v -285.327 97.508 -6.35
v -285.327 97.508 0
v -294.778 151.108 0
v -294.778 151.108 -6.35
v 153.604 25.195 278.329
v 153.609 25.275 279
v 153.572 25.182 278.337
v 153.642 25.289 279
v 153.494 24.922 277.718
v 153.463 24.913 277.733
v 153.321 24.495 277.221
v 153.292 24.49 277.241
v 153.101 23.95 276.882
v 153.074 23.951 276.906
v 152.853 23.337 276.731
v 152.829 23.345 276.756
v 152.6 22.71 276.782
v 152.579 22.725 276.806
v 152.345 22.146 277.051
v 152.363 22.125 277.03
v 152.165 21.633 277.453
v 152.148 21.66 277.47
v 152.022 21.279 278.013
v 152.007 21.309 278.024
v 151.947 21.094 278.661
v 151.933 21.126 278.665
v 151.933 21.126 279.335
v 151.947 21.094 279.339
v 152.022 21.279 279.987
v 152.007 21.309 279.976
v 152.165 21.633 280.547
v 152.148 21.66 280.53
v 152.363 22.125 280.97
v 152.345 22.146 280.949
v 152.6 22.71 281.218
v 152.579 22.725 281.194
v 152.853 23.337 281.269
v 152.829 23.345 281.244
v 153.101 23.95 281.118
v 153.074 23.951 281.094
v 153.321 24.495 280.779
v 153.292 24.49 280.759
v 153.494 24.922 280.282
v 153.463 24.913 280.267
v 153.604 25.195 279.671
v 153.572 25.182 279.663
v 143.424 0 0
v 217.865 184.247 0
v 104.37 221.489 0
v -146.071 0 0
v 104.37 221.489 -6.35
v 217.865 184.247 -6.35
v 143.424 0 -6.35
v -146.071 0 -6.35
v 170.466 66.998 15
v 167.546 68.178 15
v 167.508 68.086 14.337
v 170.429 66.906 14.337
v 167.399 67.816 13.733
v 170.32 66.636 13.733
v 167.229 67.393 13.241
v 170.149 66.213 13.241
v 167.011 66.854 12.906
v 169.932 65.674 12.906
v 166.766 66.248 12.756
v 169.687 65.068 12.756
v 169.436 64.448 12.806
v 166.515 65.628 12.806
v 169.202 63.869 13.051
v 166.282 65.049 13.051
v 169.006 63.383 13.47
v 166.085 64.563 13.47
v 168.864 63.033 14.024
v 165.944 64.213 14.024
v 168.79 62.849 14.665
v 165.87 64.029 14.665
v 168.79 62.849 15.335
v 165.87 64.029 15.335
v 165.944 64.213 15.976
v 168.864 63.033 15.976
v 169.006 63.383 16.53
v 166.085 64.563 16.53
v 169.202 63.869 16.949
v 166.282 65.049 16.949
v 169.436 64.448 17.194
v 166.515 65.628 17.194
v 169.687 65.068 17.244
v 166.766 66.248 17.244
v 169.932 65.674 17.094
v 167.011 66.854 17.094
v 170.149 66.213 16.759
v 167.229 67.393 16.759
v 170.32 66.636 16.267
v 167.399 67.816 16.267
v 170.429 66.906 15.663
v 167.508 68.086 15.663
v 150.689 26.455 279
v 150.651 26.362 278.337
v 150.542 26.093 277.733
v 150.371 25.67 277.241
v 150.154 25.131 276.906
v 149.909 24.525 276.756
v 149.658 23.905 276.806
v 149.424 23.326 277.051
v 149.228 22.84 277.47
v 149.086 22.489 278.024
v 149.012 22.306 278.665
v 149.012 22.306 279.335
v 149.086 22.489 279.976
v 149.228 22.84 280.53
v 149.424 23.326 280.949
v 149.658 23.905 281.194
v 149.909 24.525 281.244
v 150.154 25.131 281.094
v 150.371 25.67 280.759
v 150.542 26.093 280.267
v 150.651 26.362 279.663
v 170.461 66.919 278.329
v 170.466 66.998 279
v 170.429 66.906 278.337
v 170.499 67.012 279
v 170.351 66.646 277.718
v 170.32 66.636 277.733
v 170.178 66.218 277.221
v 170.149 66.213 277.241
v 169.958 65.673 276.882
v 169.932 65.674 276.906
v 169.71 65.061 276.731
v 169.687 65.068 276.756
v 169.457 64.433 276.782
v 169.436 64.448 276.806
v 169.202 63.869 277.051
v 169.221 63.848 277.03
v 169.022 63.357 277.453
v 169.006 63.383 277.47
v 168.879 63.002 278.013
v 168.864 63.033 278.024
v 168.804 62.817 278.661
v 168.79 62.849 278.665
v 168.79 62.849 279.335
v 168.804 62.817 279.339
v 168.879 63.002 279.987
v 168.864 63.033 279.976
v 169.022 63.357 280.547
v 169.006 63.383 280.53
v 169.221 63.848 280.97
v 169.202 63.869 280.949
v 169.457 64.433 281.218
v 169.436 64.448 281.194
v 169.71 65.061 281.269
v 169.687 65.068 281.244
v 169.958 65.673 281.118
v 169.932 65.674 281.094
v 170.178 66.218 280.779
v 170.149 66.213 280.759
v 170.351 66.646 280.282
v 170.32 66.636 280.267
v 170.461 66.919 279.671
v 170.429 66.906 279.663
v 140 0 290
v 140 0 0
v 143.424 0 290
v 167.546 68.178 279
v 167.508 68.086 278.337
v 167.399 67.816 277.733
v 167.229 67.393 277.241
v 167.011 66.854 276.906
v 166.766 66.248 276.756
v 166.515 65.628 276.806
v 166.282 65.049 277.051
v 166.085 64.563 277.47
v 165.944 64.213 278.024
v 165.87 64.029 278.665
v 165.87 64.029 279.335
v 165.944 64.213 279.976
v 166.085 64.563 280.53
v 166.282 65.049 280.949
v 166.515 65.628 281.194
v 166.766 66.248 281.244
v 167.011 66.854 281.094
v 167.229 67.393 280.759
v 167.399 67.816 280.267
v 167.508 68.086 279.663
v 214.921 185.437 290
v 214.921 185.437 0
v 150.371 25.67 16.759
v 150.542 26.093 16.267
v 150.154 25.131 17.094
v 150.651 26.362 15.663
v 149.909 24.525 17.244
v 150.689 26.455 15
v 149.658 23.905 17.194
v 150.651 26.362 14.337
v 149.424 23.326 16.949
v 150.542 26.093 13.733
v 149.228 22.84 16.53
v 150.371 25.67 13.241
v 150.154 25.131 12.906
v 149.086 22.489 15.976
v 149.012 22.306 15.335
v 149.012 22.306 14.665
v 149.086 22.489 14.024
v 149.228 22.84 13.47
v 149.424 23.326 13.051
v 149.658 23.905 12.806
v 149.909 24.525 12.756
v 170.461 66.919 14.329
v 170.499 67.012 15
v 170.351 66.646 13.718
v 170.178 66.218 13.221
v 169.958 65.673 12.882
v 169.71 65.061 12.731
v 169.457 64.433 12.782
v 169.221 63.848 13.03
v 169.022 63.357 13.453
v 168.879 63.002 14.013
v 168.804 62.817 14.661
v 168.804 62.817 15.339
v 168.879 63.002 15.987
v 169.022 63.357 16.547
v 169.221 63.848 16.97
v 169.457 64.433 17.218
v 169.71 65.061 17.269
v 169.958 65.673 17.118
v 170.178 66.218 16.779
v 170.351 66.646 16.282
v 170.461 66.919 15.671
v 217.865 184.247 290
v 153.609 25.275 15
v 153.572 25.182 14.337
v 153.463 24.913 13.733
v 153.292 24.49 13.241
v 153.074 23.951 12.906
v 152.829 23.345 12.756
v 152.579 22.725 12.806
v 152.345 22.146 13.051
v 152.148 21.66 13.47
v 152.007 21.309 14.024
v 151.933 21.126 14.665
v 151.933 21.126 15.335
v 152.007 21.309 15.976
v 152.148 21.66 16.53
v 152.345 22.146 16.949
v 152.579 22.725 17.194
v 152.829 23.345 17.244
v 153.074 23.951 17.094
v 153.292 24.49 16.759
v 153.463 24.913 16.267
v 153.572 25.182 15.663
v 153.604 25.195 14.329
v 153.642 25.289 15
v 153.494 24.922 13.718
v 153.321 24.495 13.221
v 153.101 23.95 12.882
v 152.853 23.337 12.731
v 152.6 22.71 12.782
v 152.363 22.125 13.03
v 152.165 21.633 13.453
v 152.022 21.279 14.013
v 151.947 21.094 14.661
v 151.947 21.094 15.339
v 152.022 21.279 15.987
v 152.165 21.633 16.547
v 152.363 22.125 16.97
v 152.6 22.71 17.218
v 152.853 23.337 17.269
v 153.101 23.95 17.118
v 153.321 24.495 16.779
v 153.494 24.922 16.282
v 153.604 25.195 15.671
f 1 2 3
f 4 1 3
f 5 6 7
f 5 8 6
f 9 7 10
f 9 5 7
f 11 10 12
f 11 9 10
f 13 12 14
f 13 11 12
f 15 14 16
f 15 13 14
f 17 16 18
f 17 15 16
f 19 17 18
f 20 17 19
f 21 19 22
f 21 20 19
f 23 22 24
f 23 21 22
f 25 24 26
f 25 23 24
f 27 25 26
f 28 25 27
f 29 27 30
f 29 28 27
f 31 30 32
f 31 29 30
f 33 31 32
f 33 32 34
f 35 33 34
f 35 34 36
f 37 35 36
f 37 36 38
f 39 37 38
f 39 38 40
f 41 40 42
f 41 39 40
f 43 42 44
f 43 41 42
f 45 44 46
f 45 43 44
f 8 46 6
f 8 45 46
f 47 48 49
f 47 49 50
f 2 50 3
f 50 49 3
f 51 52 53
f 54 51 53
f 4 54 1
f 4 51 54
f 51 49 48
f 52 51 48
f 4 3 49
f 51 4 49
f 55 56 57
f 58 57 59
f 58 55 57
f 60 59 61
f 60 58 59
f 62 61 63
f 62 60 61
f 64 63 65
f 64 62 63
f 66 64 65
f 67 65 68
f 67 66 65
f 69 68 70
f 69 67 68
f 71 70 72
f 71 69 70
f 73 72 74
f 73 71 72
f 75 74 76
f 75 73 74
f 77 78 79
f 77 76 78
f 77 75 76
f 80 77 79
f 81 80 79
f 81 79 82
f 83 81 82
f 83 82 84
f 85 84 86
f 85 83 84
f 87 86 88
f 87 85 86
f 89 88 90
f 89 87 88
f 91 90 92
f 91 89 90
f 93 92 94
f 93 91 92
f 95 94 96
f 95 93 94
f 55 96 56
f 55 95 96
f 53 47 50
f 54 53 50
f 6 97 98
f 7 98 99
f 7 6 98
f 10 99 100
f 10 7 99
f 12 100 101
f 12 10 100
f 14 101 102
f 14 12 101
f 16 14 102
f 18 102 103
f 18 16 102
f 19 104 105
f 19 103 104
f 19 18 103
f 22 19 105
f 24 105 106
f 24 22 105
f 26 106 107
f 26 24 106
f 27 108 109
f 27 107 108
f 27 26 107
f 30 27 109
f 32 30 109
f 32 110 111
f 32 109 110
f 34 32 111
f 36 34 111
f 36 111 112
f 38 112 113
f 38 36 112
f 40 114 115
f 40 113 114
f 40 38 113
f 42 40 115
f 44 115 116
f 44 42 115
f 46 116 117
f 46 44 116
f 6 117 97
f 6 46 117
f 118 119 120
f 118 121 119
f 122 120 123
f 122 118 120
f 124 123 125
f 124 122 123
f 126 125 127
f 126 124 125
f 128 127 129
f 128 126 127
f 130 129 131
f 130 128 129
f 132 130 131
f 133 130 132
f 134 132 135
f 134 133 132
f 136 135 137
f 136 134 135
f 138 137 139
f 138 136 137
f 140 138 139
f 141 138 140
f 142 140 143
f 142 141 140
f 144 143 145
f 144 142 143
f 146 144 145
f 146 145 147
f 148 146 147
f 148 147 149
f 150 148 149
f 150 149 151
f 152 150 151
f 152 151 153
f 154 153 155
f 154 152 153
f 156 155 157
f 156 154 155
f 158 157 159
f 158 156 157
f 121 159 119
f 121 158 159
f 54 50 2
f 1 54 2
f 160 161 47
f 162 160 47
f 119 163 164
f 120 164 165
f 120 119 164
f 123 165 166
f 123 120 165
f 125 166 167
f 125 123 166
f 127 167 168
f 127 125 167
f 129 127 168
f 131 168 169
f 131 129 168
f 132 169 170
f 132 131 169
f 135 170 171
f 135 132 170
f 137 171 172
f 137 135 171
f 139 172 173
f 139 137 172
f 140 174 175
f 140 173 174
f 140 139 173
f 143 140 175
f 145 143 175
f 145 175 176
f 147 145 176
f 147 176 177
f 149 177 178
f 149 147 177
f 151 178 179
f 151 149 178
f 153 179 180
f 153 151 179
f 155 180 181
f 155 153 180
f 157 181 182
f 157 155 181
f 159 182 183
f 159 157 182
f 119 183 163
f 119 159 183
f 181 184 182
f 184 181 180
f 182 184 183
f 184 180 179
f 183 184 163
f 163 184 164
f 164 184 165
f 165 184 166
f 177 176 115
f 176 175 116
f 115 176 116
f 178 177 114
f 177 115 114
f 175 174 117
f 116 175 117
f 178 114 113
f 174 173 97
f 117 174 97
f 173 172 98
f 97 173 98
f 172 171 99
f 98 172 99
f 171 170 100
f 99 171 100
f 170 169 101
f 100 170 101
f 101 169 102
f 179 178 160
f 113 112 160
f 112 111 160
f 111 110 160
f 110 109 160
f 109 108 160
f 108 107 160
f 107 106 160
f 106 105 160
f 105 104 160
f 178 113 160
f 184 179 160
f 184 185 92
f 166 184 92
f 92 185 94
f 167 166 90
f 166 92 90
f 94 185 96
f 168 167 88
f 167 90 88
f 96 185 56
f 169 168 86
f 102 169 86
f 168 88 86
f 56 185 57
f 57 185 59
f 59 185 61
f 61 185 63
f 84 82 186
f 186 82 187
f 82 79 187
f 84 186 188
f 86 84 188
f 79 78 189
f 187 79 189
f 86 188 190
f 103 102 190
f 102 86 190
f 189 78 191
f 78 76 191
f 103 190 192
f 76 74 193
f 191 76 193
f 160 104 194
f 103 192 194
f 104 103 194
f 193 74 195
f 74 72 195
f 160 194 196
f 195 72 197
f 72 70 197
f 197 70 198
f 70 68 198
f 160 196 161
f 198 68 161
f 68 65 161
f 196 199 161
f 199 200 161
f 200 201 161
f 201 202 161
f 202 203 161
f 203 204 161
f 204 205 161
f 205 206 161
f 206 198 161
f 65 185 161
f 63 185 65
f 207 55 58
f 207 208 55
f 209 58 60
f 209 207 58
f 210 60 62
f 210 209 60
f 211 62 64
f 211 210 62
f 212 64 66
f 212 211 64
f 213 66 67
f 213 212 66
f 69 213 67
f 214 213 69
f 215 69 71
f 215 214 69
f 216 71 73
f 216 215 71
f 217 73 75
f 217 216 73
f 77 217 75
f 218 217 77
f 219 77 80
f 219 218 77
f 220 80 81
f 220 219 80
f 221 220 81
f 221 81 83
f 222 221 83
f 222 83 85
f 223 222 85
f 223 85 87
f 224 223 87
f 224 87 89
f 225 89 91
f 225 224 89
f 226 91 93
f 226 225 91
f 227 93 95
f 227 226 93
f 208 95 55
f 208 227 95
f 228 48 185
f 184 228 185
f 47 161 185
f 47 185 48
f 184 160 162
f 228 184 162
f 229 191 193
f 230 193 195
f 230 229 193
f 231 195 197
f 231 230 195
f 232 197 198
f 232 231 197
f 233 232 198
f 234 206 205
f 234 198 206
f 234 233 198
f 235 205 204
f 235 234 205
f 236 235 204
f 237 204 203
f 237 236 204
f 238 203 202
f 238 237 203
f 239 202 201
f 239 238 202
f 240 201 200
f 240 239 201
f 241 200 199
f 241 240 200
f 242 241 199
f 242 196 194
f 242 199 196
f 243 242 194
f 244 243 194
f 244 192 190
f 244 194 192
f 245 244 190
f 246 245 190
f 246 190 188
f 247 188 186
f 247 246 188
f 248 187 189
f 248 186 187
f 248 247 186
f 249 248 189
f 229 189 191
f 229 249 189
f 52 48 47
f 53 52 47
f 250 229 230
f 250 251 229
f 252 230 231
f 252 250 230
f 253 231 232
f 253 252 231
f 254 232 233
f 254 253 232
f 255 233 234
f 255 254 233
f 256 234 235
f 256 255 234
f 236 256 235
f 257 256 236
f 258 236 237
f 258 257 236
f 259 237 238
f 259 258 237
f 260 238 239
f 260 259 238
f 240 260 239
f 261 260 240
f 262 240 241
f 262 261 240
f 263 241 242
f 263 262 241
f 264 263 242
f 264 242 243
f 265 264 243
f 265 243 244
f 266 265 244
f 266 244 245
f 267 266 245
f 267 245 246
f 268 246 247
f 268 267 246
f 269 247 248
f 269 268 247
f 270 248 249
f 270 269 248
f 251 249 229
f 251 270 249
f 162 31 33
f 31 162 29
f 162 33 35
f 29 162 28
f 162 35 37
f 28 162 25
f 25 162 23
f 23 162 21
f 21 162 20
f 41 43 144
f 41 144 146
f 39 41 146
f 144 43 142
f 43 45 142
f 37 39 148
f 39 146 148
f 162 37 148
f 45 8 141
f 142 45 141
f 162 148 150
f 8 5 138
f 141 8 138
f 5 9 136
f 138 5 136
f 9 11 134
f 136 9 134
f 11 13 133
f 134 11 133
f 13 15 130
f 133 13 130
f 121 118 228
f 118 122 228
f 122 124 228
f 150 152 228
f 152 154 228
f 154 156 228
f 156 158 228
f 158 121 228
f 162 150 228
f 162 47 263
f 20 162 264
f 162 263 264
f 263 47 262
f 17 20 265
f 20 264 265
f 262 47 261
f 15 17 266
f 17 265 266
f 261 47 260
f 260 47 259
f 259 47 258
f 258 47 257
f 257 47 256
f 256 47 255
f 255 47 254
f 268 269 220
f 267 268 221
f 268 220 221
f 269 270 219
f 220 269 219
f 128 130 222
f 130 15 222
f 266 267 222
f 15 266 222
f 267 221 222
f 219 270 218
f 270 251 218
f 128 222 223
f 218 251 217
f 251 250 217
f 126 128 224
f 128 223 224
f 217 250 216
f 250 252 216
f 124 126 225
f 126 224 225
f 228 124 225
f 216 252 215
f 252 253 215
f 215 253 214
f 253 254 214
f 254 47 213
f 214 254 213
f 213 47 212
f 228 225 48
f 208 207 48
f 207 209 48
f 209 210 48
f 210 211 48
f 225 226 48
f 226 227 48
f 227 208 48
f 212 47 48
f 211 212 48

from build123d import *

# Parameters (mm, degrees)
BOSS_EXTRUDE1_DEPTH           = 290
BOSS_EXTRUDE2_DEPTH           = 6.35
M4_CLEARANCE_HOLE1_AT_2_COUNT = 2
M4_CLEARANCE_HOLE1_AT_2_PITCH = 45
M4_CLEARANCE_HOLE1_AT_3_COUNT = 2
M4_CLEARANCE_HOLE1_AT_3_PITCH = 264
M4_CLEARANCE_HOLE1_AT_4_COUNT = 2
M4_CLEARANCE_HOLE1_AT_4_PITCH = 267.807766878


with BuildPart() as part:
    # Sketch1 → Boss-Extrude1 (new body)
    with BuildSketch(Plane.XY):
        Polygon((140, 0), (143.424347808, 0), (217.865127421, 184.247394979), (214.921318683, 185.436770913), align=None)
    extrude(amount=BOSS_EXTRUDE1_DEPTH)

    # Sketch4 → M4 Clearance Hole1 (revolve, cut)
    with BuildSketch(Plane(origin=(169.646809347, 64.90286982, 279), x_dir=(0.3746065934159096, 0.9271838545667884, 0), z_dir=(0, 0, 1))):
        Polygon((0, 0), (0, 489.265093346), (2.25, 489.265093346), (2.25, 0.025), (2.275, 0), align=None)
    m4_clearance_hole1 = revolve(axis=Axis((175.534426824, 62.524117951, 279), (-0.9271838545667884, 0.3746065934159096, 0)), mode=Mode.SUBTRACT)

    # M4 Clearance Hole1 at 2: M4 Clearance Hole1 ×2
    with Locations(*[Vector(-0.3746065934159096, -0.9271838545667884, 0) * (i * M4_CLEARANCE_HOLE1_AT_2_PITCH) for i in range(1, M4_CLEARANCE_HOLE1_AT_2_COUNT)]):
        add(m4_clearance_hole1, mode=Mode.SUBTRACT)

    # M4 Clearance Hole1 at 3: M4 Clearance Hole1 ×2
    with Locations(*[(0, 0, -i * M4_CLEARANCE_HOLE1_AT_3_PITCH) for i in range(1, M4_CLEARANCE_HOLE1_AT_3_COUNT)]):
        add(m4_clearance_hole1, mode=Mode.SUBTRACT)

    # M4 Clearance Hole1 at 4: M4 Clearance Hole1 ×2
    with Locations(*[Vector(-0.06294551087981771, -0.15579560646021043, -0.9857817160344241) * (i * M4_CLEARANCE_HOLE1_AT_4_PITCH) for i in range(1, M4_CLEARANCE_HOLE1_AT_4_COUNT)]):
        add(m4_clearance_hole1, mode=Mode.SUBTRACT)


with BuildPart() as body_2:
    # Sketch2 → Boss-Extrude2 (new body)
    with BuildSketch(Plane.XY):
        Polygon((-294.777867348, 151.108031048), (104.369939009, 221.488558599), (217.865127421, 184.247394979), (143.424347808, 0), (-146.070887152, 0), (-285.326734681, 97.50799418), align=None)
    extrude(amount=-BOSS_EXTRUDE2_DEPTH)


solid = Compound([part.part, body_2.part])
